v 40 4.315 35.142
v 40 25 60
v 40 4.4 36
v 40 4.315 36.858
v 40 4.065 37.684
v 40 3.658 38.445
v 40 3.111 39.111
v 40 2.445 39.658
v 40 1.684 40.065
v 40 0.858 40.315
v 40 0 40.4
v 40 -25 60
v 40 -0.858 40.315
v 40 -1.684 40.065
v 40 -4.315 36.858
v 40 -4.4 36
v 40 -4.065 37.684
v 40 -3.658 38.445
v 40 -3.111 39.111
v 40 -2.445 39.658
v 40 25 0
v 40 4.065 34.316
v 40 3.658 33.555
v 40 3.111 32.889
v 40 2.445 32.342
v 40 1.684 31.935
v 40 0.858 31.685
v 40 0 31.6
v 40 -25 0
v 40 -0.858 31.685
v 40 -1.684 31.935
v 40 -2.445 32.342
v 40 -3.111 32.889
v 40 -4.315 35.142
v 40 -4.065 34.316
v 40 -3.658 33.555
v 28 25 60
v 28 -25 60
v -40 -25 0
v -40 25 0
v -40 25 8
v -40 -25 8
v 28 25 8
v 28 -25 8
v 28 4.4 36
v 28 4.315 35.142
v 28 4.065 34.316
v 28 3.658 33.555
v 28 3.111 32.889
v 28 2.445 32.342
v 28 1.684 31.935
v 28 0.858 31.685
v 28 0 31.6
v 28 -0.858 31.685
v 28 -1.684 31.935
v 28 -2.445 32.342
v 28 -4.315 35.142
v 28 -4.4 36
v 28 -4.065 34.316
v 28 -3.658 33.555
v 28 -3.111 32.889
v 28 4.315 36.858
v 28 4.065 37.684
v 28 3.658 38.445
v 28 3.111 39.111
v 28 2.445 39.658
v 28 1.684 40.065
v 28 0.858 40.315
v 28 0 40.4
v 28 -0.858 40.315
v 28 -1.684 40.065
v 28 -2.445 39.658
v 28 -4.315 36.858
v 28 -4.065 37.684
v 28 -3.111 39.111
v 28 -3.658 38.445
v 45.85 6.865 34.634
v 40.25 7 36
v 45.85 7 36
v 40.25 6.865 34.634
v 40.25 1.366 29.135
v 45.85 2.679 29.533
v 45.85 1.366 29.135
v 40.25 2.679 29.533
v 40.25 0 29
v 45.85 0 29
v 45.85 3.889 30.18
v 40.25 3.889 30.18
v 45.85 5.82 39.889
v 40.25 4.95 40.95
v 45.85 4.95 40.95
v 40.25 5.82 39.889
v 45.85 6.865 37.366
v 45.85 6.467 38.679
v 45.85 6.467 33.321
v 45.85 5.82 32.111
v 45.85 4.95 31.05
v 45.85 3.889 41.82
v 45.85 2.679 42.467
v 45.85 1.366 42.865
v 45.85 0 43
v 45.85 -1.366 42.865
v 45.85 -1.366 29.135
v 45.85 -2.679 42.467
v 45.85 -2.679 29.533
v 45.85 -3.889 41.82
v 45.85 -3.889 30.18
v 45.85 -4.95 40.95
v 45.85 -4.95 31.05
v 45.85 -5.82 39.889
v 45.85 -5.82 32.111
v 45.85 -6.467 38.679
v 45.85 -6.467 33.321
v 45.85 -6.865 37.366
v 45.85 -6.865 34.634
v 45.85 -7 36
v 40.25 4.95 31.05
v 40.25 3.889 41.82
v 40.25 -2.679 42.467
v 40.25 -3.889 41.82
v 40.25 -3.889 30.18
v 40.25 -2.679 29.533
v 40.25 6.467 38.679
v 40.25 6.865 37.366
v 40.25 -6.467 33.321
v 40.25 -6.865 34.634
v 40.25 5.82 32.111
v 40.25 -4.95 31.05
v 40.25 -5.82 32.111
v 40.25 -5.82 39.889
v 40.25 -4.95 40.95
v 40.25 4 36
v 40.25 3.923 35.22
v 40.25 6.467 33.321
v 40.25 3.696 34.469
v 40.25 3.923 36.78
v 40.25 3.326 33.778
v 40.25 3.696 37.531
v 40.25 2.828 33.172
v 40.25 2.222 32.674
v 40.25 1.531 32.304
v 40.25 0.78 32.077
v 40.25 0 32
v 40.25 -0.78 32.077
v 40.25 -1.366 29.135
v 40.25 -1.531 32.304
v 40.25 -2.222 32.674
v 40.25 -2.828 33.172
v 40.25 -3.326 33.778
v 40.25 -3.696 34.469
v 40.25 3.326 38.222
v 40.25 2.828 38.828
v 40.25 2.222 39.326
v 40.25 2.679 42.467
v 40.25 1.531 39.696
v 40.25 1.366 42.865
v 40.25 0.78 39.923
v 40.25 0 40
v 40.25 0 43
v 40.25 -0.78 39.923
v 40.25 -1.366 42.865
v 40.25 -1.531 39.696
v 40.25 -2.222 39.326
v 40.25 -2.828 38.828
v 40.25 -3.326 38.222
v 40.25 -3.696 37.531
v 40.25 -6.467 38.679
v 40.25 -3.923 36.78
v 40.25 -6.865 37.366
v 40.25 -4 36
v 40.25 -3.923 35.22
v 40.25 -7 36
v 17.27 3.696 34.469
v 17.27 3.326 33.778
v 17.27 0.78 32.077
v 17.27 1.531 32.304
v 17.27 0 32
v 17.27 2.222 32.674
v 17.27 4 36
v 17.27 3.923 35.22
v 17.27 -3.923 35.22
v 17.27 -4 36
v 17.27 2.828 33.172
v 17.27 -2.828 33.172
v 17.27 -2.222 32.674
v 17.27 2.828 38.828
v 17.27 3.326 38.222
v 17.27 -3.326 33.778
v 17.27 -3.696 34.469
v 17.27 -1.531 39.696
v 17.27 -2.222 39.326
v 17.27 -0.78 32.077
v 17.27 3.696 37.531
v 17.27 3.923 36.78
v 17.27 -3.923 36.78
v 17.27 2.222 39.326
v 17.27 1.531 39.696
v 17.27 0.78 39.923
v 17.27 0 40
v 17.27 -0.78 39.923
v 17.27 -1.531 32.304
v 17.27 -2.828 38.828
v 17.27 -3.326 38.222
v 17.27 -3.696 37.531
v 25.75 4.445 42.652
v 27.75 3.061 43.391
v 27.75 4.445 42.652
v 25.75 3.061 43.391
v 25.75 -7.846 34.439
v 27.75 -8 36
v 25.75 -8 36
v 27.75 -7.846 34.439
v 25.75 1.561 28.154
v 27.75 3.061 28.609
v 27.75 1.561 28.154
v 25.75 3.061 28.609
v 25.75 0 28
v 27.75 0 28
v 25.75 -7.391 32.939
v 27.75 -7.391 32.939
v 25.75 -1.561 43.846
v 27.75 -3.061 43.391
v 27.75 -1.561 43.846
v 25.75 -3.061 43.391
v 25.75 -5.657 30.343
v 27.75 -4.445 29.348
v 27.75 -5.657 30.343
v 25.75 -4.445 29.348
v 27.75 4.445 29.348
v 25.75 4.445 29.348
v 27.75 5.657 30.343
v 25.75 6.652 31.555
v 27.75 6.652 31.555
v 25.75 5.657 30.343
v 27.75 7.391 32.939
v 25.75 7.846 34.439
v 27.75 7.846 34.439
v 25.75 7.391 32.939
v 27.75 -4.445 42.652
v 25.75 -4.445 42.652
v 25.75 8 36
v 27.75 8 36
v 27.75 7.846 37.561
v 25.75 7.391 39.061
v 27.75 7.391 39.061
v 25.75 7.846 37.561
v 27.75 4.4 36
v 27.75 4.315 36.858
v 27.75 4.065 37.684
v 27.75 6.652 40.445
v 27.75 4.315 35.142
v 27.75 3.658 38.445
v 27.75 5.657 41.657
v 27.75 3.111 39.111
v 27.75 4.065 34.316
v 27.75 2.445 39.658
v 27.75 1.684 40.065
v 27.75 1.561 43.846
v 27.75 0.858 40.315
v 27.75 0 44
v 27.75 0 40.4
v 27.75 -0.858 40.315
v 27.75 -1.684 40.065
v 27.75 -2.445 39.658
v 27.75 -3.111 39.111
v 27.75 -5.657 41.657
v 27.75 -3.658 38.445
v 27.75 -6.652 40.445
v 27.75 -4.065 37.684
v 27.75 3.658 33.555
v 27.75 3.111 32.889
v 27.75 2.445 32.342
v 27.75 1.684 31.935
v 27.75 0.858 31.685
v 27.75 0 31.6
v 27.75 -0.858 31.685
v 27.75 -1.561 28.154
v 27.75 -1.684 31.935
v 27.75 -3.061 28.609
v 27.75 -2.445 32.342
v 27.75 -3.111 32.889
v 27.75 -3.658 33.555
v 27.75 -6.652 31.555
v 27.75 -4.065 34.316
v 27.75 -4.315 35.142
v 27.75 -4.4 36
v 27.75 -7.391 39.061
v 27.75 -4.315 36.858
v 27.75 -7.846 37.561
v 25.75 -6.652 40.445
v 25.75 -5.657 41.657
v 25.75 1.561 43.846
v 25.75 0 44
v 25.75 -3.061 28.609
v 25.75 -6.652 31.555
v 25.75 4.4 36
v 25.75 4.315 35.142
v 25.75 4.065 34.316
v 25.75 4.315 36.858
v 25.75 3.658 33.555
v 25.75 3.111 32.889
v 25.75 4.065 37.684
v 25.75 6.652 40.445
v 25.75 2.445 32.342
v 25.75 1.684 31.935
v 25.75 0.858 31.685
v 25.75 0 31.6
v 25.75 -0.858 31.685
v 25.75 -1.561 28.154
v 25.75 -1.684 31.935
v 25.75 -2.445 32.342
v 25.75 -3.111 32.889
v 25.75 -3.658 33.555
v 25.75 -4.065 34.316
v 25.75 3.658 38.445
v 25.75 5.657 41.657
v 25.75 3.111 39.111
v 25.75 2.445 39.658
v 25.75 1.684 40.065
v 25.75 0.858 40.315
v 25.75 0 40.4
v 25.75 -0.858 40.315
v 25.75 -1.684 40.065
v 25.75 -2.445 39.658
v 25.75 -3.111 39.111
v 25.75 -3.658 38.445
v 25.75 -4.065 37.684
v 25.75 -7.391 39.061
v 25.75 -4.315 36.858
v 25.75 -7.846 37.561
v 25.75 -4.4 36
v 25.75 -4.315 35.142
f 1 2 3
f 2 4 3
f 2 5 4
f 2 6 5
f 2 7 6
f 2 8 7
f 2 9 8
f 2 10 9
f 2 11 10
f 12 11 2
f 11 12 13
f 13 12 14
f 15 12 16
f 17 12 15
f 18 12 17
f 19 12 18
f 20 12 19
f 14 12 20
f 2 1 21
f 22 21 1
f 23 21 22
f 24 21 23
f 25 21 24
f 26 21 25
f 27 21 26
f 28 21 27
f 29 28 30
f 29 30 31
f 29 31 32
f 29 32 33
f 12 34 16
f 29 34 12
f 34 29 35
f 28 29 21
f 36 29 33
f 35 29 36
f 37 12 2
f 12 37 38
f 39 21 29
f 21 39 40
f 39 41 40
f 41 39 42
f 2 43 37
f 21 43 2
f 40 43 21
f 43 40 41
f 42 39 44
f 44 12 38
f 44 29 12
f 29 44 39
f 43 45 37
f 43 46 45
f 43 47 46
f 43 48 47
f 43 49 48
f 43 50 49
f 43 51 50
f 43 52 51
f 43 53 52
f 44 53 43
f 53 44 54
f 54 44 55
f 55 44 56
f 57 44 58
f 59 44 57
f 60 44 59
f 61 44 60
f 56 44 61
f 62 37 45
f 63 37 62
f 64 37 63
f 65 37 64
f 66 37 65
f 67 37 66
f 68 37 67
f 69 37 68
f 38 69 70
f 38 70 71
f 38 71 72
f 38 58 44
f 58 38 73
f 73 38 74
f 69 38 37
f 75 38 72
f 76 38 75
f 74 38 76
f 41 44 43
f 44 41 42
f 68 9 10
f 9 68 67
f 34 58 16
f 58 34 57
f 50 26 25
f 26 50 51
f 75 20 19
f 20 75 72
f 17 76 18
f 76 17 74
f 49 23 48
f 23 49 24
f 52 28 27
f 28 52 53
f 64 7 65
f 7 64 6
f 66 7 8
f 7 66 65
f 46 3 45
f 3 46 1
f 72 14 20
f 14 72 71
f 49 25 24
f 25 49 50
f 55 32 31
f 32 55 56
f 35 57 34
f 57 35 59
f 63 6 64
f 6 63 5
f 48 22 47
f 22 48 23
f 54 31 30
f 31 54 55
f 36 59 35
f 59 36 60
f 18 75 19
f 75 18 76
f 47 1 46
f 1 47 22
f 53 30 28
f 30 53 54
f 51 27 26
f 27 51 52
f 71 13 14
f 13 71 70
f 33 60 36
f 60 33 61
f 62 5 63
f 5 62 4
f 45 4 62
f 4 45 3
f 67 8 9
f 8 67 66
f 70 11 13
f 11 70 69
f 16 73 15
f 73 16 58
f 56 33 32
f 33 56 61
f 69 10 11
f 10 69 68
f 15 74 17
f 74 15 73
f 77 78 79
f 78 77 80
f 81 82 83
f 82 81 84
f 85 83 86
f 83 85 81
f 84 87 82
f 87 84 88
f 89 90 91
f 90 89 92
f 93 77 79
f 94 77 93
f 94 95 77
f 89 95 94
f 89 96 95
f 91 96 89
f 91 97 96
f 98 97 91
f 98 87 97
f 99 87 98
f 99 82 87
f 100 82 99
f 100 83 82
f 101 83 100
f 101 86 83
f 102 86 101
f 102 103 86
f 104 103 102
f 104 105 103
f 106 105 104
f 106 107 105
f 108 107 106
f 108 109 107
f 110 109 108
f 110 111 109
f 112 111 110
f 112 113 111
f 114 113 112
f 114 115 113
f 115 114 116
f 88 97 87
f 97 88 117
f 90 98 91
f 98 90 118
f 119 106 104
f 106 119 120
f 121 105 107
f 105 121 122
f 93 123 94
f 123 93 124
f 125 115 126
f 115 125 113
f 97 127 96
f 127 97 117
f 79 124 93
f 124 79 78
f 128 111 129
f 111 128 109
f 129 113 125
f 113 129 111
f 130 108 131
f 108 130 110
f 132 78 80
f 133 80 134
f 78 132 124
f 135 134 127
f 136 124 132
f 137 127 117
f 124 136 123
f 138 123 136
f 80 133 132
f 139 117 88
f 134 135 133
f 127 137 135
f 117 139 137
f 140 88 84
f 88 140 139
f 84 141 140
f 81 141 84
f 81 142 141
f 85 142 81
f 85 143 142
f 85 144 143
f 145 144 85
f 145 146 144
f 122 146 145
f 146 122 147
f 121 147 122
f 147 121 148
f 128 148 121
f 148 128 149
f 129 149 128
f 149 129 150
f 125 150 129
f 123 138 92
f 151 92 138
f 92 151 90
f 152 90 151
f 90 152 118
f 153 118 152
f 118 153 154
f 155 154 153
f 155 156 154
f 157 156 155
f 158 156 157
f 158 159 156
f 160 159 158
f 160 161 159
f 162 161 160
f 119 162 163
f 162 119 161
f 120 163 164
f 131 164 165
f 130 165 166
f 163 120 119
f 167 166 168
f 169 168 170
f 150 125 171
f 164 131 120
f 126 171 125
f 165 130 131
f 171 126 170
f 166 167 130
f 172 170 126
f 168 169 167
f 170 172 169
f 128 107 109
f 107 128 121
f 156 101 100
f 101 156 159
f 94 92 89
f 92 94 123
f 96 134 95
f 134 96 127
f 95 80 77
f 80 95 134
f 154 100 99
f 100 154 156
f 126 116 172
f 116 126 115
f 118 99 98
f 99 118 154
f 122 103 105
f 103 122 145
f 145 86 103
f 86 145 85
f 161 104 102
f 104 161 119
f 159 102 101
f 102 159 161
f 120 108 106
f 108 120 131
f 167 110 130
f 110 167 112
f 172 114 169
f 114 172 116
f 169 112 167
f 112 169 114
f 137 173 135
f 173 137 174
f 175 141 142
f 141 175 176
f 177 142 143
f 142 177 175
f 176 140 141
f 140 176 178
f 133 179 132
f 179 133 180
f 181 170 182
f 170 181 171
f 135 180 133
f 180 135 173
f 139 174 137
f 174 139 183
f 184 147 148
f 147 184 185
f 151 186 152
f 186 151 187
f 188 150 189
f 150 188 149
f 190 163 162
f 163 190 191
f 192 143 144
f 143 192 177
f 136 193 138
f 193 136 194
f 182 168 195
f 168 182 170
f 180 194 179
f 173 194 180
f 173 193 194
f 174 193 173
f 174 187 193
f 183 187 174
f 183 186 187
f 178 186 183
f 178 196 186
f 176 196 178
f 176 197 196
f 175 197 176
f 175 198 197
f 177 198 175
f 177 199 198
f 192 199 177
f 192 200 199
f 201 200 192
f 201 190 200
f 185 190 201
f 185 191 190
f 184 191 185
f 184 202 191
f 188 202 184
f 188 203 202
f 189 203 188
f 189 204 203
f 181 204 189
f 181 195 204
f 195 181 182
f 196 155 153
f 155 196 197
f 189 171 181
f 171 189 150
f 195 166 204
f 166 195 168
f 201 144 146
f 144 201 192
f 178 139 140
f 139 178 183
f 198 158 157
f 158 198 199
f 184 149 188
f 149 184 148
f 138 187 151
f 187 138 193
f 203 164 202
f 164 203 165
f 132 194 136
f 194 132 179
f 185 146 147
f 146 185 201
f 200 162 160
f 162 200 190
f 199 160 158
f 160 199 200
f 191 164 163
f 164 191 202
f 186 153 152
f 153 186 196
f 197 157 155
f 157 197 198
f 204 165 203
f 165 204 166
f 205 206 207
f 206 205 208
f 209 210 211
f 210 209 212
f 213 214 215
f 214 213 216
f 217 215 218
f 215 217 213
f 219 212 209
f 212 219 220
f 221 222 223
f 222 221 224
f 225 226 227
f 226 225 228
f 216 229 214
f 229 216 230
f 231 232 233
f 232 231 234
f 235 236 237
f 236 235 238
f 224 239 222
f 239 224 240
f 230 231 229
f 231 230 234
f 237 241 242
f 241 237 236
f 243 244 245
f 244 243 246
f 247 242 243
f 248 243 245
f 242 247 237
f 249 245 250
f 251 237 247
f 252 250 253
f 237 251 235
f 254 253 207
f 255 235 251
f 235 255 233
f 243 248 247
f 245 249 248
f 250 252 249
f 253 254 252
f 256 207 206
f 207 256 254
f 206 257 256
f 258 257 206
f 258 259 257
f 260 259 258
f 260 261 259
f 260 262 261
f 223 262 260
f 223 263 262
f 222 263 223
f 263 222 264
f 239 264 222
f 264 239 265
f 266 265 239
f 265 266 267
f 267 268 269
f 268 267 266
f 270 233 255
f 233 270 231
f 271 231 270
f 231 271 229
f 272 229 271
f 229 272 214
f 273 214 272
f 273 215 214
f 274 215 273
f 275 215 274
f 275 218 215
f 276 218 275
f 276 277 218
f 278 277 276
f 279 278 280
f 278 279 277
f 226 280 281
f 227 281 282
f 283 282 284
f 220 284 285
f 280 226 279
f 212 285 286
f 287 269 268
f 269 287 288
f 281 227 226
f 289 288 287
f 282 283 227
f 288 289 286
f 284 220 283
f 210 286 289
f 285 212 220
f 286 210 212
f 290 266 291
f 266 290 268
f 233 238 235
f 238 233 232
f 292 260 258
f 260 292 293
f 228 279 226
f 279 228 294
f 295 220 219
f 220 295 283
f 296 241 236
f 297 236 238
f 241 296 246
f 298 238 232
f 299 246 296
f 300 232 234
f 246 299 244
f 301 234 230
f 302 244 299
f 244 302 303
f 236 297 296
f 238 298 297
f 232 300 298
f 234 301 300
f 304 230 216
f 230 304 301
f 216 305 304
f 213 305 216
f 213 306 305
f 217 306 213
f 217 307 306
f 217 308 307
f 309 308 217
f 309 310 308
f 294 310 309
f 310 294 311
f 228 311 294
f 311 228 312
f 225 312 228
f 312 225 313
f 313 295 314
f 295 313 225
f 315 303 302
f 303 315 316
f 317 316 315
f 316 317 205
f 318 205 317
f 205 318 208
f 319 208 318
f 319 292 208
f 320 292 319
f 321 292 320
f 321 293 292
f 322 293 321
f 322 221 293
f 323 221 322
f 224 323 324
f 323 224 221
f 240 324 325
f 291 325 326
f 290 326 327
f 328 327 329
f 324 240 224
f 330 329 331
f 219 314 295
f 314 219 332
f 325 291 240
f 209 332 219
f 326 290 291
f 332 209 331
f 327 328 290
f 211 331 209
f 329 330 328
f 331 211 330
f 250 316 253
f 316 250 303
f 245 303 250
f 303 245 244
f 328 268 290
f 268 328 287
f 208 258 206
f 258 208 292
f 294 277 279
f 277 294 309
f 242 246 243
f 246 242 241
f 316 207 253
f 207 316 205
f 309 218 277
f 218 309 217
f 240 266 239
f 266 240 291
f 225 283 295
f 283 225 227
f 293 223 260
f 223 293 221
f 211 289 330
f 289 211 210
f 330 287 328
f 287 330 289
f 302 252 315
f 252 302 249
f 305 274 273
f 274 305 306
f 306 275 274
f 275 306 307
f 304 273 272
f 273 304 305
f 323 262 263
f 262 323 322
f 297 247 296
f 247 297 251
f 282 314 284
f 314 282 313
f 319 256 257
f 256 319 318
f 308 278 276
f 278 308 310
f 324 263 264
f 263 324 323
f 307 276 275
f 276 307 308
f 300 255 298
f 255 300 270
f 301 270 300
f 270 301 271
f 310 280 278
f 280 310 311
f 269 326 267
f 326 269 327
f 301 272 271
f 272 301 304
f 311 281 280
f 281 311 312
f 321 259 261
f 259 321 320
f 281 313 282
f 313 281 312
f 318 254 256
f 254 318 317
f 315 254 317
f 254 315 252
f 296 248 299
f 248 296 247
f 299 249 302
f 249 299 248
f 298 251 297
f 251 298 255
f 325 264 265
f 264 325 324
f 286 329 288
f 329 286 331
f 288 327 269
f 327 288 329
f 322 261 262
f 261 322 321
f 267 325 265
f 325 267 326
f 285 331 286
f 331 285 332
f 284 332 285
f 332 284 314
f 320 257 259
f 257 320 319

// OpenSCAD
$fn = 32;

// ------------------------------------------------------------------------
// Bolted bracket: 80 x 50 mm bracket with 1 bolt joints
// Every part is its own module, assembly() places them once.
// ------------------------------------------------------------------------

// --- part 1 ---
module bracket() {
  difference() {
    translate([-40, -25, 0]) cube([80, 50, 60]);
    translate([-41, -26, 8]) cube([69, 52, 53]);
    translate([34, 0, 36]) rotate([0, 90, 0]) cylinder(h = 14, d = 8.8, center = true);
  }
}

// --- part 2 ---
module bolt() {
  cylinder(h = 5.6, d = 14);
  translate([0, 0, -22.98]) cylinder(h = 22.98, d = 8);
}

// --- part 3 ---
module washer() {
  difference() {
      translate([0, 0, 0]) cylinder(h = 2, d = 16);
      translate([0, 0, -1]) cylinder(h = 4, d = 8.8);
    }
}

// --- assembly ---
module assembly() {
  translate([0, 0, 0]) rotate([0, 0, 0]) bracket();
  translate([40.25, 0, 36]) rotate([0, 90, 0]) bolt();
  translate([25.75, 0, 36]) rotate([0, 90, 0]) washer();
}

assembly();
